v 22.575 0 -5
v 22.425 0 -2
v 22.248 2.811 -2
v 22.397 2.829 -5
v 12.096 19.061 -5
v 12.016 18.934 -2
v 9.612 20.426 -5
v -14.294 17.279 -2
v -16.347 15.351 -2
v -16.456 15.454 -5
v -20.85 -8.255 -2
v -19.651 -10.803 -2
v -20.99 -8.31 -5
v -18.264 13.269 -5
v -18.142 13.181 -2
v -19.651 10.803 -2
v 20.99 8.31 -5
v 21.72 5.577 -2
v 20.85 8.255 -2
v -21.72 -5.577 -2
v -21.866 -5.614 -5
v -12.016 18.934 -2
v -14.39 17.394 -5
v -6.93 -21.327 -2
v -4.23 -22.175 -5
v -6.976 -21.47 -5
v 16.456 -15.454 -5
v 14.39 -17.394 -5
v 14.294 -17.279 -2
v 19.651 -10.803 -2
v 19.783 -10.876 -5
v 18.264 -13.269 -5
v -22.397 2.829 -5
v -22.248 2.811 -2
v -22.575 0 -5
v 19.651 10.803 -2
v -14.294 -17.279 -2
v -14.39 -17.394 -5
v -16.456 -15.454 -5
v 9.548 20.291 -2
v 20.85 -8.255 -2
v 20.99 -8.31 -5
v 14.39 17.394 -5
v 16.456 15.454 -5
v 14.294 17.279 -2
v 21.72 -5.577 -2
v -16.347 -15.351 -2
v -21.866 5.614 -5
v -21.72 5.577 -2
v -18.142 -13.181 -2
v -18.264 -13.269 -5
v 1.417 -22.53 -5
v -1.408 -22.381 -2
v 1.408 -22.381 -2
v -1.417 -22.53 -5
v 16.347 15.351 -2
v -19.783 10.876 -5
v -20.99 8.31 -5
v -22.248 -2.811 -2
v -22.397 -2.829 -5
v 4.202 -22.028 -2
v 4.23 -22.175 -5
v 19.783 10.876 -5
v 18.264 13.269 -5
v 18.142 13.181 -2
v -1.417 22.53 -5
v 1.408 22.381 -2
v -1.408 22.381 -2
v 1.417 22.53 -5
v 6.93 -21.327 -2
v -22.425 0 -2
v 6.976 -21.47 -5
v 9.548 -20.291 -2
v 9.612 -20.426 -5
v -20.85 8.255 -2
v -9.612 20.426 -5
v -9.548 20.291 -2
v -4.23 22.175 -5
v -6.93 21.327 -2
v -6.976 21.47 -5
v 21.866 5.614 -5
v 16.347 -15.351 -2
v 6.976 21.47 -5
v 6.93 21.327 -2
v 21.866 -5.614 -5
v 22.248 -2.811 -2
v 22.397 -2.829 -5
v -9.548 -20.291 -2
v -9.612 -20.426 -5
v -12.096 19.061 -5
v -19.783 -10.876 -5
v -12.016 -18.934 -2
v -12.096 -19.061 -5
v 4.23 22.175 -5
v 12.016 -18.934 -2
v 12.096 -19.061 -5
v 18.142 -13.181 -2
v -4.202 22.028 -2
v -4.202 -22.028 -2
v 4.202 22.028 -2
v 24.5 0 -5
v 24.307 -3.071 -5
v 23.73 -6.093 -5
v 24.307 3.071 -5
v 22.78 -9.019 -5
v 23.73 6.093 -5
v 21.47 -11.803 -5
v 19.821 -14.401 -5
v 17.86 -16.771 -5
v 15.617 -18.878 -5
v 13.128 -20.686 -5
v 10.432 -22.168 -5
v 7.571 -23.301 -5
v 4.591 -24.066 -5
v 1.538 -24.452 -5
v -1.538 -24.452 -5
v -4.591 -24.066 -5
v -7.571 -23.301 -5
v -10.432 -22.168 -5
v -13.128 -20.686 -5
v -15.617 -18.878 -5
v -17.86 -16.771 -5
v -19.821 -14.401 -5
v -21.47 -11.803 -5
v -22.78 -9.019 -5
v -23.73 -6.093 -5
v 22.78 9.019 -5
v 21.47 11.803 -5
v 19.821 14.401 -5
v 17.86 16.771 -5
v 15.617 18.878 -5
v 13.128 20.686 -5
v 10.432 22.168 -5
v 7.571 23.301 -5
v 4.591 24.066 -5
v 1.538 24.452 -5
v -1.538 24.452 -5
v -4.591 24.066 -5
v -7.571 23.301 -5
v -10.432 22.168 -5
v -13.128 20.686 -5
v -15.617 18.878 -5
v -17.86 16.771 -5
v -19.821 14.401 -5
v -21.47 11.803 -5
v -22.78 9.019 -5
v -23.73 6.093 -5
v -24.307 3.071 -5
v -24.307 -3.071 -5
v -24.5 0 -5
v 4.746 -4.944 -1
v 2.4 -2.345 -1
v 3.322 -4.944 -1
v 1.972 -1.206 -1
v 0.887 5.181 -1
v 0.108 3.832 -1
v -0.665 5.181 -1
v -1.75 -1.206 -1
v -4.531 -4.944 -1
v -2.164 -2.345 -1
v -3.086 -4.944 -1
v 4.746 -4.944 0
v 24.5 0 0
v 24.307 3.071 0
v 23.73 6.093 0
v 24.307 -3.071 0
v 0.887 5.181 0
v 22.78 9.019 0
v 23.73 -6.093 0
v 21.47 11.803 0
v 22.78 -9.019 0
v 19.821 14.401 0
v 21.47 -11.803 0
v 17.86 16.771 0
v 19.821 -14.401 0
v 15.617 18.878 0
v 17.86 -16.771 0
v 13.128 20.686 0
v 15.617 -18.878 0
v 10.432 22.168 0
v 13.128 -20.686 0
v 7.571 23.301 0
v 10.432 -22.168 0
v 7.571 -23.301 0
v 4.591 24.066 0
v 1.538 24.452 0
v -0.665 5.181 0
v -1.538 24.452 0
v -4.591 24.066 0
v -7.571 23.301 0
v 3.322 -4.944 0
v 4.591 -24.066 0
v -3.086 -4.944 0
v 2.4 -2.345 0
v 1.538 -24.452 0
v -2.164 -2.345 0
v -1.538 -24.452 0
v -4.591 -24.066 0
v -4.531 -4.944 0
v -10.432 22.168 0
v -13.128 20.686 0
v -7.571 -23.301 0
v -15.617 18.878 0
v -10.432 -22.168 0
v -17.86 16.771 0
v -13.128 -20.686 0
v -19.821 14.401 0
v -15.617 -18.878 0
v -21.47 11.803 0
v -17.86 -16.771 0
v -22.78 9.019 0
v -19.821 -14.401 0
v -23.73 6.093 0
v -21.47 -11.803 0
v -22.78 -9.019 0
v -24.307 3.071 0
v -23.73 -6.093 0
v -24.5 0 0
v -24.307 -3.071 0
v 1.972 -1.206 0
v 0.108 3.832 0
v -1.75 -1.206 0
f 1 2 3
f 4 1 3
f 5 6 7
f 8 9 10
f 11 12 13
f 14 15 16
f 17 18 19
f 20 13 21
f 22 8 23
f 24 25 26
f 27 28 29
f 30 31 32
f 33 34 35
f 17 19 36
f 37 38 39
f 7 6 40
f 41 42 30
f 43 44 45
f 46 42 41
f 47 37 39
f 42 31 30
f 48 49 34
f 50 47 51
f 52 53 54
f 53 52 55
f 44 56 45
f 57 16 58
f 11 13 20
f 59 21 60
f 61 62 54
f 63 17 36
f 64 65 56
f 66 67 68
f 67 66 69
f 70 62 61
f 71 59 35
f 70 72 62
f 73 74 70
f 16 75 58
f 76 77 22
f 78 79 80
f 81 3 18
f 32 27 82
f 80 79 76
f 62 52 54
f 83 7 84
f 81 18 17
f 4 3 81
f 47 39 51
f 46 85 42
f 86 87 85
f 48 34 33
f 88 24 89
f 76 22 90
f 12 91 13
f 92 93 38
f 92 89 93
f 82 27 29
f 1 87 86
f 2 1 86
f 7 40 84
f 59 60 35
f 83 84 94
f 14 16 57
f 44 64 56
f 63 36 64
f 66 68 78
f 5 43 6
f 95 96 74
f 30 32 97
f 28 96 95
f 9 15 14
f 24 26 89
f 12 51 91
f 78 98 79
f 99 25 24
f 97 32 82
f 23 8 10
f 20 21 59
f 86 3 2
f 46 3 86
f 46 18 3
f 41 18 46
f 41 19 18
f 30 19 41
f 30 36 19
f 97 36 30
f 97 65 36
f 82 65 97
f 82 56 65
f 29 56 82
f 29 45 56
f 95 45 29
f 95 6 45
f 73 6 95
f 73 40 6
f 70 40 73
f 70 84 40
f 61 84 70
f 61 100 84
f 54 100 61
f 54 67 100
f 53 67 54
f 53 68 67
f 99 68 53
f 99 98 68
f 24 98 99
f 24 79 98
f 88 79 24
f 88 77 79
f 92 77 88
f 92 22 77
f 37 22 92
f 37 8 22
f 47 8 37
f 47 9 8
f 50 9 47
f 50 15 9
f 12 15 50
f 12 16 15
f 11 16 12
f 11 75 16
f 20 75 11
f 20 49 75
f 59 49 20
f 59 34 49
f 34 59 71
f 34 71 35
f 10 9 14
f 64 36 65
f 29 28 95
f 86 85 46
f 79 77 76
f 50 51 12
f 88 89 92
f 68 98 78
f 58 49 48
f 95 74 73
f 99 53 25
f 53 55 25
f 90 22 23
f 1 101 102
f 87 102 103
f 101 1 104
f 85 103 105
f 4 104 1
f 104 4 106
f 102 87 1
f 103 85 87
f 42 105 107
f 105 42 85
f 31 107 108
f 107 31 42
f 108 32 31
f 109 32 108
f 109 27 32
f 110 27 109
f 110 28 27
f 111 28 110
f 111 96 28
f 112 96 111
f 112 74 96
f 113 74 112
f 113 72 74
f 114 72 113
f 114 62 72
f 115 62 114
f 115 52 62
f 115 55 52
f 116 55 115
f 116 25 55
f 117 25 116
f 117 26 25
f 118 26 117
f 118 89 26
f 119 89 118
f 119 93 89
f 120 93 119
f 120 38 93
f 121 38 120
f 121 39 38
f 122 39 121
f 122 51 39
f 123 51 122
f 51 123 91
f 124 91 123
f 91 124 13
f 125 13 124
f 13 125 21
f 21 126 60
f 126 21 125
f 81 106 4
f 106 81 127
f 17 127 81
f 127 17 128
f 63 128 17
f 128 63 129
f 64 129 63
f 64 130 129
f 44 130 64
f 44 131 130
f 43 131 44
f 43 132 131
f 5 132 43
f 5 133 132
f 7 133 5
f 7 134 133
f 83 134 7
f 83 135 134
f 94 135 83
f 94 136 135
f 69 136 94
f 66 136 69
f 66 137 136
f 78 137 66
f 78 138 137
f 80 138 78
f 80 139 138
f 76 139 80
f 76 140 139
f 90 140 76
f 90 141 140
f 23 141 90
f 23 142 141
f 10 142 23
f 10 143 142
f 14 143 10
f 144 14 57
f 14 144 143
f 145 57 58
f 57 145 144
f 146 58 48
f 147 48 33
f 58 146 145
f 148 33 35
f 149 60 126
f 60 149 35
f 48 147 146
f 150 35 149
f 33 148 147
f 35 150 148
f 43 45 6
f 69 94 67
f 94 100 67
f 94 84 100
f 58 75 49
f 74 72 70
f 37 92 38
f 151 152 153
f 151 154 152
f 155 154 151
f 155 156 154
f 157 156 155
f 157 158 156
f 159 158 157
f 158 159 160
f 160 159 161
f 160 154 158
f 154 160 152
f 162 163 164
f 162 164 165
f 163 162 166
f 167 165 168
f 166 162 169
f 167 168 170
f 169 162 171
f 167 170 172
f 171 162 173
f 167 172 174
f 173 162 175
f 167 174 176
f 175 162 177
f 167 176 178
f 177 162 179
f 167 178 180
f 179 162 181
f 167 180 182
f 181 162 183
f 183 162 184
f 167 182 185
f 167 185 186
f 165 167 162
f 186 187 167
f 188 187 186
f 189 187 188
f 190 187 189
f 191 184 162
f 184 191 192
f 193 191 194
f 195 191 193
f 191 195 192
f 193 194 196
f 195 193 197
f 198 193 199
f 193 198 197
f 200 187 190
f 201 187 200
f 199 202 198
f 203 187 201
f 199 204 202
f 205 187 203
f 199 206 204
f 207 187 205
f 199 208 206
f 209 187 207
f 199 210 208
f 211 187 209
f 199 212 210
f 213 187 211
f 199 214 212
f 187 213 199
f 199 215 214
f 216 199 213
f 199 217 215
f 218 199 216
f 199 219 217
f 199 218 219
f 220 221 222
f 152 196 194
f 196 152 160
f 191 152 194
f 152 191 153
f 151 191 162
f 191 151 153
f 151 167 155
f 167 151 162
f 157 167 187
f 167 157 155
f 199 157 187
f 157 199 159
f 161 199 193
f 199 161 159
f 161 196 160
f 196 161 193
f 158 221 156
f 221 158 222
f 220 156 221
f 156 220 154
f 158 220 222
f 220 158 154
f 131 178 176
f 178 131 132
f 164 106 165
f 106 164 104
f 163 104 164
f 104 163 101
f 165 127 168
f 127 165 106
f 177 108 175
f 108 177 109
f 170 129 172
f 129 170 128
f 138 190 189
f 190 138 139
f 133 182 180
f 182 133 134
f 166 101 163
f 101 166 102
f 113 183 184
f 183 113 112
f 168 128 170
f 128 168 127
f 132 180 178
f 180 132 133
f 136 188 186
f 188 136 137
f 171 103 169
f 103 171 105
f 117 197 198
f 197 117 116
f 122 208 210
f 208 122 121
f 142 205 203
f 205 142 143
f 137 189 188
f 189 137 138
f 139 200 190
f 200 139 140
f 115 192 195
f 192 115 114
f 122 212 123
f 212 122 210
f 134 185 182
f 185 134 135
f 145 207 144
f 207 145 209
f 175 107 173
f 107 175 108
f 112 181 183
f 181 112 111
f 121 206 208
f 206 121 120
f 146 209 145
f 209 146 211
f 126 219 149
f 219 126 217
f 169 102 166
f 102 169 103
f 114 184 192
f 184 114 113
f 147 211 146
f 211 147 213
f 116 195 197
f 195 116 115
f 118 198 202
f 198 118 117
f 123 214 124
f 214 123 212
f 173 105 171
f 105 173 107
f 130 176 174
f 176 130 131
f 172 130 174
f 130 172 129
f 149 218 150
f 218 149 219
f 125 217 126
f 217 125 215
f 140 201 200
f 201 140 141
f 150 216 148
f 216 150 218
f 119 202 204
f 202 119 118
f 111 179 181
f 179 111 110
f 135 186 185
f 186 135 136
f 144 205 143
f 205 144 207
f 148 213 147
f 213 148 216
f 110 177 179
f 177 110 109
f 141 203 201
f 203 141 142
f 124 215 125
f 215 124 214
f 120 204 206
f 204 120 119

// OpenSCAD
$fn = 50;

difference() {
	union() {
		translate(v = [0, 0, -5.0]) {
			cylinder(h = 5, r = 24.5);
		}
	}
	union() {
		#translate(v = [0, 0, -5.0]) {
			cylinder(h = 3, r1 = 22.575, r2 = 22.425);
		}
		translate(v = [0, 0, -1]) {
			linear_extrude(height = 1) {
				text(font = "Impact", halign = "center", size = 10, text = "A", valign = "center");
			}
		}
	}
}
